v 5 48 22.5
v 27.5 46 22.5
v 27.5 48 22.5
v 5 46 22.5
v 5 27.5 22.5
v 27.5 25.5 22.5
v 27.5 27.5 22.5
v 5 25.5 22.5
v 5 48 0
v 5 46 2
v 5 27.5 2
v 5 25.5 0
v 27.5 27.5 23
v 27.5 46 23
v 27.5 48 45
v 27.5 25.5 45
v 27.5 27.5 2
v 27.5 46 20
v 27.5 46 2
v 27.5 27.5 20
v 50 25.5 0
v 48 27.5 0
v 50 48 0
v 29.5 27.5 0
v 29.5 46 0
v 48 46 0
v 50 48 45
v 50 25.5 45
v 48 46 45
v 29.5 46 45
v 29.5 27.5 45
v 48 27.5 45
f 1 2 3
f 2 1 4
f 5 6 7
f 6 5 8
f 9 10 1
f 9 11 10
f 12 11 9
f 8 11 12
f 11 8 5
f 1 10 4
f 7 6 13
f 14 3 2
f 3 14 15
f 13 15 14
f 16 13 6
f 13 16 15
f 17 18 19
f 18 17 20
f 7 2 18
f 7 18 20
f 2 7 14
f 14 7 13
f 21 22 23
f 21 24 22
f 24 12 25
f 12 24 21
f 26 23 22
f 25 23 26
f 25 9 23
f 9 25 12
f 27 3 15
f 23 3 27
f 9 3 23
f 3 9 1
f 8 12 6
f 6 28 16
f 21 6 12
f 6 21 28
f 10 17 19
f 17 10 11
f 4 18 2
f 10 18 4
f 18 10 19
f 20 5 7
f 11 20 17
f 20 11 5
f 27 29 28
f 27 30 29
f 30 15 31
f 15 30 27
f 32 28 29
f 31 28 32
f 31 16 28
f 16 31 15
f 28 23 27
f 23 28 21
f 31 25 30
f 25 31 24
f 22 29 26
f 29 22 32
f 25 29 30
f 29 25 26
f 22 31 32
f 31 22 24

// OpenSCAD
Build_SpacerJig = 1;
Build_AngleBracket = 2;
Build_BracketWithGrove = 3;
Build_VerticalBracketWithGrove=8;
Build_AttachemtnSpacer =4;
Build_CeilingBracket=5;
Build_hookBracket=6;
Build_PowerStripHolder=7;
SubBuild_PowerStripBottom= 1;
SubBuild_PowerStripTop= 2;

Build = Build_AngleBracket;
SubBuild=SubBuild_PowerStripTop;


Width = 18.50;
Length = Width;
Height = Width;
WallThickness = (Build == Build_SpacerJig ?  8.0:2.0); //Changed for SpacerJig()
DoubleLength = 2*AddWall(Length);

ScrewDiameter = (Build == Build_SpacerJig ? 10 : 3.5);
SpacerWidth = (Build == Build_SpacerJig ? 7.5 : AddWall(ScrewDiameter)); //Changed for SpacerJig()
SpacerLength=Length;
SpacerHeight=4;
Grovelength=DoubleLength;

function OuterWidth(w) = AddWall(w);
function OuterLength(l) = AddWall(l);
function OuterHeight(h) = AddWall(h);
function AddWall(length) = length + (2*WallThickness);
function AddExtra(item, extra) = item+extra;
function Middle(length) = length/2;
function AddWall2(length)=length + 4.0;
ScrewDiameter2 = 3.5;
function DoubleLength(value=DoubleLength) = (value==DoubleLength)? value: value*2;
function SpacerHeight(extra=0) = SpacerHeight+extra;
function SpacerLength(extra=0) = SpacerLength+extra;
function SpacerWidth(extra=0) = SpacerWidth+extra;

module squareTube(innerWidth, innerDepth, innerHeight, wallThickness)
{
    difference()
    {
    echo("squareTube()",OuterWidth(innerWidth), OuterLength(innerDepth), OuterHeight(innerHeight),wallThickness);
    cube([OuterWidth(innerWidth), OuterLength(innerDepth), OuterHeight(innerHeight)], false);
    translate([Build != Build_SpacerJig ? wallThickness : wallThickness+SpacerHeight, wallThickness,-1])
        cube([innerWidth, innerDepth, OuterHeight(innerHeight)+2], false);
    }
}

//Changed to be immutable method.
module angleBracket(width,length,height,wallThickness)
{
        //do the final placement so it does not have to be adjusted everytime in Cura.
    translate([0,0,DoubleLength])
    rotate([0,180,0])
    difference()
    {
        union()
        {    
            translate([OuterWidth(width),0,DoubleLength()])
            rotate([0,90,0])
            squareTube(width,length,height,wallThickness);
            squareTube(width,length,AddWall(2*height),wallThickness);
        }
//this is a hack, but need to get it done quickly.        
//remove the top of the bracket so wood can be placed in after otherside is attached.
    translate([OuterWidth(width),wallThickness,OuterHeight(height)-0.5])
        {
        cube([OuterWidth(width)+1, length, wallThickness+1], false);
        }
    }
}

module hookBracket()
{
        //do the final placement so it does not have to be adjusted everytime in Cura.
    translate([0,0,DoubleLength])
    rotate([0,180,0])
    difference()
    {
        union()
        {   //squareTube
            //             22.5               
            translate([0,0,AddWall(Height)])
            rotate([0,-90,0])
            squareTube(Width,Length,AddWall2(2*Height),WallThickness);
            
            translate([-Middle(DoubleLength),Middle(AddWall(Width)),11.5]) 
            rotate([0,0,90])
            linear_extrude(height = AddWall(Height), center = true, convexity = 10, scale=[4.3,8.6], $fn=100)
            circle(r = 2.6);            
        }
        translate([ -Middle(DoubleLength), Middle(OuterWidth(Width)),0])
        cylinder($fn=100,h=20,d1=ScrewDiameter,d2=ScrewDiameter,center=false);
    }
}

module Groove(grooveLength,grooveWidth, thickness, headLength)
{
    cubeSize=[headLength,headLength,AddWall(0)];
    grooveSize=[AddExtra(grooveWidth,2), AddExtra(grooveLength,2),thickness*2];
    rotateBevel=[90,45,90];
    bevelxMove= -AddWall(0)+1;
    bevelyMove= -1.8;
    
        //Insert Grove
        translate([-thickness-1,Middle(AddWall(headLength))-Middle(AddExtra(grooveWidth,2.0)),-1])
        rotate([90,0,90])
        cube(grooveSize);

        //Add bottom bevel
        translate([bevelxMove,bevelyMove,-5])
        rotate(rotateBevel)
        cube(cubeSize);
        
        //Add top bevel
        translate([bevelxMove,bevelyMove,AddExtra(grooveLength,5)])
        rotate(rotateBevel)
        cube(cubeSize);
}

//Changed to be immutable method.
module BracketWithGrove(width,length,height,wallThickness,grooveLength,grooveWidth, thickness)
{
    difference()
    {
        angleBracket(width,length,height,wallThickness);
        Groove(grooveLength,grooveWidth, wallThickness,length);
    }
}

module VerticalBracketWithGrove(width,length,height,wallThickness,grooveLength,grooveWidth, thickness)
{
    echo("VerticalBracketWithGrove",width,length,height,wallThickness,grooveLength,grooveWidth, thickness);
    difference()
    {
        rotate([0,0,180])
            angleBracket(width,length,height,wallThickness);
        translate([22.5,0,0])
            rotate([0,0,90])
            Groove(grooveLength,grooveWidth, wallThickness,length);
    }
}

module attachmentSpacer()
{
    difference()
    {

        cube([SpacerWidth, SpacerLength,SpacerHeight]);
        
        translate([Middle(SpacerWidth), Middle(Length)],0)
            cylinder($fn=100,h=SpacerHeight,d1=ScrewDiameter,d2=ScrewDiameter,center=false);
    }
}

module CeilingBracket()
{
    difference()
    {
        union()
            {
                wallSize    = [AddWall(Width),AddWall(Length),WallThickness];
                wallRotation= [90,0,0];
                toleftWall  = -AddWall(Width);
                torightWall = AddWall(Width);
                tofrontWall = WallThickness;
                tobackWall  = AddWall(Width);
                toBottom    = DoubleLength(WallThickness);
                
                //center bracket
                squareTube(Width,Length,Height+AddWall(0),WallThickness);
                translate([-AddWall(Width),0,0]) cube([3*AddWall(Width)
                    ,AddWall(Length),DoubleLength(WallThickness)]);
                
                supportWall(wallSize, wallRotation, toleftWall,  tofrontWall, toBottom);
                supportWall(wallSize, wallRotation, toleftWall,  tobackWall,  toBottom);
                supportWall(wallSize, wallRotation, torightWall, tofrontWall, toBottom);
                supportWall(wallSize, wallRotation, torightWall, tobackWall,  toBottom);
            }
        
            leftHole=-Middle(AddWall(Width));
            centerHole=Middle(AddWall(Width));
            rightHole=Middle(3*AddWall(Width));
            toTheMiddle=Middle(AddWall(Length));

            screwHole(SpacerHeight(2),ScrewDiameter,leftHole,toTheMiddle,-1);
            screwHole(SpacerHeight(2),ScrewDiameter,centerHole,toTheMiddle,-1);
            screwHole(SpacerHeight(2),ScrewDiameter,rightHole,toTheMiddle,-1);
        
            //cut-a-ways to make brackets have an angle
            cubeSize = [2*AddWall(Width),2*AddWall(Length),DoubleLength(WallThickness)];
            rotate45 = [90,-45,0];
            toTheLeft=-AddWall(Width);
            toTheRight=2*AddWall(Width);
            toFront=WallThickness+1;
            toBack=AddWall(Length)+1;
            
            angleSupport(cubeSize,rotate45,toTheLeft,toFront,4);
            angleSupport(cubeSize,rotate45,toTheLeft,toBack,4);
            angleSupport(cubeSize,rotate45,toTheRight,toFront,4);
            angleSupport(cubeSize,rotate45,toTheRight,toBack,4);
    }
}

module supportWall(cubeSize,rotation,xMove,yMove,zMove)
{
    angleSupport(cubeSize,rotation,xMove,yMove,zMove);
}

module screwHole(height,diameter,xMove,yMove,zMove)
{
    translate([xMove,yMove,zMove]) 
    cylinder($fn=100,h=height,d=diameter,center=false);
}

module angleSupport(cubeSize,rotation,xMove,yMove,zMove)
{
    translate([xMove,yMove,zMove]) 
    rotate(rotation)
    cube(cubeSize);
}

module SpacerJig()
{
    union()
    difference()
    {
        squareTube(Width,Length,DoubleLength,WallThickness);
        echo("SpacerJig()",Width,Length,Height,WallThickness);
        echo("SpacerJig()-translate",
            AddWall(Width)-WallThickness+SpacerHeight-0.5,
            Middle(AddWall(Width))-Middle(SpacerWidth+1.0));
        //insert groove.
        translate([AddWall(Width)-WallThickness+SpacerHeight-0.5,
                    Middle(AddWall(Width))-Middle(SpacerWidth+1.0),
                    -1])
        rotate([0,0,90])
        rotate([90,0,0])
        cube([SpacerWidth+1.0, AddWall(DoubleLength)+2,SpacerHeight +1]);
        
        //insert screw head channel.
        echo("screw head channel",AddWall(ScrewDiameter)-WallThickness+SpacerHeight-0.5,
                    Middle(AddWall(Width))-Middle(SpacerWidth+1.0),
                    -1);
        translate([10,
                    11,
                    -1])
        rotate([0,0,90])
        rotate([90,0,0])
        cube([12, AddWall(DoubleLength)+2,SpacerHeight +1]);
        
        //Drill hole
        translate([-1,Middle(AddWall(Length)),Middle(AddWall(DoubleLength))]) 
        rotate([0,0,90])
        rotate([90,0,0])
        cylinder($fn=100,h=2*WallThickness,d1=ScrewDiameter+2,d2=ScrewDiameter+2,center=false);
        
        //add bevel
        echo(69,35.5,35.5);
        translate([48,35.5,100]) 
        rotate([0,-135,0])
        rotate([90,0,0])
        cube([2*AddWall(Width),2*AddWall(Length),AddWall(Length)+2]);       
        //add spacer
        #translate([0,0,Middle(DoubleLength)])
        translate([AddWall(Width)-WallThickness+SpacerHeight-0.5,
            Middle(AddWall(Width))-Middle(SpacerWidth),
            -1])
        rotate([0,0,90])
        rotate([90,0,0])
        difference()
        {
            cube([AddWall2(ScrewDiameter2), SpacerLength,SpacerHeight]);
            translate([Middle(SpacerWidth), Middle(Length)],0)
            cylinder($fn=100,h=SpacerHeight,d1=ScrewDiameter2,d2=ScrewDiameter2,center=false);
        }
    }
    //holder
    translate([0,-0.5,Middle(DoubleLength)-SpacerLength])
    translate([AddWall(Width)-WallThickness+SpacerHeight,
    Middle(AddWall(Width))-Middle(SpacerWidth)-0.5,
    -1])
    rotate([0,0,90])
    rotate([90,0,0])
    difference()
    {
    cube([AddWall2(ScrewDiameter2)+2, SpacerLength,SpacerHeight]);
    translate([Middle(AddWall2(ScrewDiameter2)+2), Middle(Length)],0)
    cylinder($fn=100,h=Length,d1=ScrewDiameter2,d2=ScrewDiameter2,center=false);
    }
}

module PowerStripHolder(which)
{
    baseWidth = 74.0;
    baseHeight=28.0;
    basePlugDepth = 35.0;
    basePlugLipDepth=29.5;
    baseTopDepth=41;
    baseSeamDepth=19.0;
    seamToBevelDepth=16.0;
    powerCordDiameter=11.0;
    includeBottomBracket=false;
    
    if(which == SubBuild_PowerStripBottom)
    {
        PowerStripHolderBottom(baseWidth,baseHeight,basePlugDepth,WallThickness, Width,Length,0);
        
        //Bottom Bracket
        if(includeBottomBracket)
        {
            difference()
            {
                translate([0,Middle(baseTopDepth)/2,0])
                rotate([0,90,0])
                squareTube(Width,Width,baseWidth,WallThickness); 
                translate([0,Middle(baseTopDepth)/2,-AddExtra(Width,4)])
                rotate([0,90,0])
                Groove(AddExtra(baseWidth,2), SpacerWidth, WallThickness, Width);
            }
        }
    }
    else
        PowerStripHolderTop(baseWidth,baseHeight,baseTopDepth,WallThickness, Width,Length,powerCordDiameter);
}
module PowerStripHolderBottom(width, height, depth, wallThickness, widthBracket, depthBracket, withGrooves)
{
    union()
    {
        squareTube(width, depth, height, wallThickness);
        translate([wallThickness,wallThickness,0])
        cube([width,depth,2]);
        
        difference()
        {
            //Right Bracket
            translate([OuterWidth(width),Middle(depth)/2,0])
            squareTube(widthBracket,depthBracket,height,wallThickness);   
            
            //Groove for Right Bracket
            if(withGrooves>0)
            {
                translate([OuterWidth(width)+OuterWidth(widthBracket),Middle(depth)/2,1])
                Groove(AddExtra(height,2), SpacerWidth, WallThickness, Width);  
            }
        }
        
        difference()
        {
            //Left Bracket
            translate([-OuterWidth(widthBracket),Middle(depth)/2,0])
            squareTube(widthBracket,depthBracket,height,wallThickness);    
            
            //Groove for Left Bracket
            if(withGrooves>0)
            {
                translate([-OuterWidth(widthBracket)+2,Middle(depth)/2,1])
                Groove(AddExtra(height,2), SpacerWidth, WallThickness, Width); 
            }
        }    
        

    }
}
module PowerStripHolderTop(width, height, depth, wallThickness, widthBracket, depthBracket, powerCordDiameter)
{
    triangle_points =[[0,0],[23,0],[0,8]];
    triangle_paths =[[0,1,2]];

    difference()
    {
        union()
        {
            PowerStripHolderBottom(width, height, depth, wallThickness, widthBracket, depthBracket,0);
 
            translate([39,43,2])
            rotate([180,-90,0])
            linear_extrude(height = width, center = true, convexity = 10, scale=[1,1], $fn=100)
            polygon(triangle_points,triangle_paths,10);
        }
        
        translate([Middle(width), Middle(depth),0])
        linear_extrude(height=20, center=true, convexity=10, scale=[1,1], $fn=100)
        circle(d=powerCordDiameter,center=true);
        
        translate([Middle(width), depth-7,Middle(depth)])
        rotate([0,0,90])
        cube([Middle(depth)+7,powerCordDiameter,100], center=true);
    }
    
}

Rows = 1;
Columns = 1;

module main()
{
    //build = Build_BracketWithGrove;
    for(x=[1:Rows], y=[1:Columns])
    {
        if(Build == Build_SpacerJig) 
        {
            translate([(Grovelength+5)*x,(SpacerLength(7))*y,0]) SpacerJig();
        }
        if(Build == Build_AngleBracket) 
        {
            translate([(Grovelength+5)*x,(SpacerLength(7))*y,0]) 
                angleBracket(Width,Length,Height,WallThickness);
        }    
        if(Build == Build_BracketWithGrove) 
        {
            translate([(Grovelength+5)*x,(SpacerLength(7))*y,0])
                BracketWithGrove(Width,Length,Height,WallThickness, DoubleLength(), SpacerHeight());
        }    
        if(Build == Build_VerticalBracketWithGrove) 
        {
            translate([(Grovelength+5)*x,(SpacerLength(7))*y,0])
                VerticalBracketWithGrove(Width,Length,Height,WallThickness, DoubleLength(), SpacerHeight());
        }    
        if(Build == Build_AttachemtnSpacer) 
            {
                translate([(SpacerWidth+5)*x,(SpacerLength(5))*y,0])attachmentSpacer();
            }    
        if(Build == Build_CeilingBracket) 
            {
                translate([(AddWall(Width)*3+1)*x,(SpacerLength(6))*y,0]) CeilingBracket();
            }    
        if(Build == Build_hookBracket)
        {
            difference()
            {
            hookBracket();
            rotate([0,90,0])
            Groove(Grovelength, SpacerWidth, WallThickness, Width);
            }
        }
        if(Build==Build_PowerStripHolder)
        {
            PowerStripHolder(SubBuild);
        }
    }
}


main();
